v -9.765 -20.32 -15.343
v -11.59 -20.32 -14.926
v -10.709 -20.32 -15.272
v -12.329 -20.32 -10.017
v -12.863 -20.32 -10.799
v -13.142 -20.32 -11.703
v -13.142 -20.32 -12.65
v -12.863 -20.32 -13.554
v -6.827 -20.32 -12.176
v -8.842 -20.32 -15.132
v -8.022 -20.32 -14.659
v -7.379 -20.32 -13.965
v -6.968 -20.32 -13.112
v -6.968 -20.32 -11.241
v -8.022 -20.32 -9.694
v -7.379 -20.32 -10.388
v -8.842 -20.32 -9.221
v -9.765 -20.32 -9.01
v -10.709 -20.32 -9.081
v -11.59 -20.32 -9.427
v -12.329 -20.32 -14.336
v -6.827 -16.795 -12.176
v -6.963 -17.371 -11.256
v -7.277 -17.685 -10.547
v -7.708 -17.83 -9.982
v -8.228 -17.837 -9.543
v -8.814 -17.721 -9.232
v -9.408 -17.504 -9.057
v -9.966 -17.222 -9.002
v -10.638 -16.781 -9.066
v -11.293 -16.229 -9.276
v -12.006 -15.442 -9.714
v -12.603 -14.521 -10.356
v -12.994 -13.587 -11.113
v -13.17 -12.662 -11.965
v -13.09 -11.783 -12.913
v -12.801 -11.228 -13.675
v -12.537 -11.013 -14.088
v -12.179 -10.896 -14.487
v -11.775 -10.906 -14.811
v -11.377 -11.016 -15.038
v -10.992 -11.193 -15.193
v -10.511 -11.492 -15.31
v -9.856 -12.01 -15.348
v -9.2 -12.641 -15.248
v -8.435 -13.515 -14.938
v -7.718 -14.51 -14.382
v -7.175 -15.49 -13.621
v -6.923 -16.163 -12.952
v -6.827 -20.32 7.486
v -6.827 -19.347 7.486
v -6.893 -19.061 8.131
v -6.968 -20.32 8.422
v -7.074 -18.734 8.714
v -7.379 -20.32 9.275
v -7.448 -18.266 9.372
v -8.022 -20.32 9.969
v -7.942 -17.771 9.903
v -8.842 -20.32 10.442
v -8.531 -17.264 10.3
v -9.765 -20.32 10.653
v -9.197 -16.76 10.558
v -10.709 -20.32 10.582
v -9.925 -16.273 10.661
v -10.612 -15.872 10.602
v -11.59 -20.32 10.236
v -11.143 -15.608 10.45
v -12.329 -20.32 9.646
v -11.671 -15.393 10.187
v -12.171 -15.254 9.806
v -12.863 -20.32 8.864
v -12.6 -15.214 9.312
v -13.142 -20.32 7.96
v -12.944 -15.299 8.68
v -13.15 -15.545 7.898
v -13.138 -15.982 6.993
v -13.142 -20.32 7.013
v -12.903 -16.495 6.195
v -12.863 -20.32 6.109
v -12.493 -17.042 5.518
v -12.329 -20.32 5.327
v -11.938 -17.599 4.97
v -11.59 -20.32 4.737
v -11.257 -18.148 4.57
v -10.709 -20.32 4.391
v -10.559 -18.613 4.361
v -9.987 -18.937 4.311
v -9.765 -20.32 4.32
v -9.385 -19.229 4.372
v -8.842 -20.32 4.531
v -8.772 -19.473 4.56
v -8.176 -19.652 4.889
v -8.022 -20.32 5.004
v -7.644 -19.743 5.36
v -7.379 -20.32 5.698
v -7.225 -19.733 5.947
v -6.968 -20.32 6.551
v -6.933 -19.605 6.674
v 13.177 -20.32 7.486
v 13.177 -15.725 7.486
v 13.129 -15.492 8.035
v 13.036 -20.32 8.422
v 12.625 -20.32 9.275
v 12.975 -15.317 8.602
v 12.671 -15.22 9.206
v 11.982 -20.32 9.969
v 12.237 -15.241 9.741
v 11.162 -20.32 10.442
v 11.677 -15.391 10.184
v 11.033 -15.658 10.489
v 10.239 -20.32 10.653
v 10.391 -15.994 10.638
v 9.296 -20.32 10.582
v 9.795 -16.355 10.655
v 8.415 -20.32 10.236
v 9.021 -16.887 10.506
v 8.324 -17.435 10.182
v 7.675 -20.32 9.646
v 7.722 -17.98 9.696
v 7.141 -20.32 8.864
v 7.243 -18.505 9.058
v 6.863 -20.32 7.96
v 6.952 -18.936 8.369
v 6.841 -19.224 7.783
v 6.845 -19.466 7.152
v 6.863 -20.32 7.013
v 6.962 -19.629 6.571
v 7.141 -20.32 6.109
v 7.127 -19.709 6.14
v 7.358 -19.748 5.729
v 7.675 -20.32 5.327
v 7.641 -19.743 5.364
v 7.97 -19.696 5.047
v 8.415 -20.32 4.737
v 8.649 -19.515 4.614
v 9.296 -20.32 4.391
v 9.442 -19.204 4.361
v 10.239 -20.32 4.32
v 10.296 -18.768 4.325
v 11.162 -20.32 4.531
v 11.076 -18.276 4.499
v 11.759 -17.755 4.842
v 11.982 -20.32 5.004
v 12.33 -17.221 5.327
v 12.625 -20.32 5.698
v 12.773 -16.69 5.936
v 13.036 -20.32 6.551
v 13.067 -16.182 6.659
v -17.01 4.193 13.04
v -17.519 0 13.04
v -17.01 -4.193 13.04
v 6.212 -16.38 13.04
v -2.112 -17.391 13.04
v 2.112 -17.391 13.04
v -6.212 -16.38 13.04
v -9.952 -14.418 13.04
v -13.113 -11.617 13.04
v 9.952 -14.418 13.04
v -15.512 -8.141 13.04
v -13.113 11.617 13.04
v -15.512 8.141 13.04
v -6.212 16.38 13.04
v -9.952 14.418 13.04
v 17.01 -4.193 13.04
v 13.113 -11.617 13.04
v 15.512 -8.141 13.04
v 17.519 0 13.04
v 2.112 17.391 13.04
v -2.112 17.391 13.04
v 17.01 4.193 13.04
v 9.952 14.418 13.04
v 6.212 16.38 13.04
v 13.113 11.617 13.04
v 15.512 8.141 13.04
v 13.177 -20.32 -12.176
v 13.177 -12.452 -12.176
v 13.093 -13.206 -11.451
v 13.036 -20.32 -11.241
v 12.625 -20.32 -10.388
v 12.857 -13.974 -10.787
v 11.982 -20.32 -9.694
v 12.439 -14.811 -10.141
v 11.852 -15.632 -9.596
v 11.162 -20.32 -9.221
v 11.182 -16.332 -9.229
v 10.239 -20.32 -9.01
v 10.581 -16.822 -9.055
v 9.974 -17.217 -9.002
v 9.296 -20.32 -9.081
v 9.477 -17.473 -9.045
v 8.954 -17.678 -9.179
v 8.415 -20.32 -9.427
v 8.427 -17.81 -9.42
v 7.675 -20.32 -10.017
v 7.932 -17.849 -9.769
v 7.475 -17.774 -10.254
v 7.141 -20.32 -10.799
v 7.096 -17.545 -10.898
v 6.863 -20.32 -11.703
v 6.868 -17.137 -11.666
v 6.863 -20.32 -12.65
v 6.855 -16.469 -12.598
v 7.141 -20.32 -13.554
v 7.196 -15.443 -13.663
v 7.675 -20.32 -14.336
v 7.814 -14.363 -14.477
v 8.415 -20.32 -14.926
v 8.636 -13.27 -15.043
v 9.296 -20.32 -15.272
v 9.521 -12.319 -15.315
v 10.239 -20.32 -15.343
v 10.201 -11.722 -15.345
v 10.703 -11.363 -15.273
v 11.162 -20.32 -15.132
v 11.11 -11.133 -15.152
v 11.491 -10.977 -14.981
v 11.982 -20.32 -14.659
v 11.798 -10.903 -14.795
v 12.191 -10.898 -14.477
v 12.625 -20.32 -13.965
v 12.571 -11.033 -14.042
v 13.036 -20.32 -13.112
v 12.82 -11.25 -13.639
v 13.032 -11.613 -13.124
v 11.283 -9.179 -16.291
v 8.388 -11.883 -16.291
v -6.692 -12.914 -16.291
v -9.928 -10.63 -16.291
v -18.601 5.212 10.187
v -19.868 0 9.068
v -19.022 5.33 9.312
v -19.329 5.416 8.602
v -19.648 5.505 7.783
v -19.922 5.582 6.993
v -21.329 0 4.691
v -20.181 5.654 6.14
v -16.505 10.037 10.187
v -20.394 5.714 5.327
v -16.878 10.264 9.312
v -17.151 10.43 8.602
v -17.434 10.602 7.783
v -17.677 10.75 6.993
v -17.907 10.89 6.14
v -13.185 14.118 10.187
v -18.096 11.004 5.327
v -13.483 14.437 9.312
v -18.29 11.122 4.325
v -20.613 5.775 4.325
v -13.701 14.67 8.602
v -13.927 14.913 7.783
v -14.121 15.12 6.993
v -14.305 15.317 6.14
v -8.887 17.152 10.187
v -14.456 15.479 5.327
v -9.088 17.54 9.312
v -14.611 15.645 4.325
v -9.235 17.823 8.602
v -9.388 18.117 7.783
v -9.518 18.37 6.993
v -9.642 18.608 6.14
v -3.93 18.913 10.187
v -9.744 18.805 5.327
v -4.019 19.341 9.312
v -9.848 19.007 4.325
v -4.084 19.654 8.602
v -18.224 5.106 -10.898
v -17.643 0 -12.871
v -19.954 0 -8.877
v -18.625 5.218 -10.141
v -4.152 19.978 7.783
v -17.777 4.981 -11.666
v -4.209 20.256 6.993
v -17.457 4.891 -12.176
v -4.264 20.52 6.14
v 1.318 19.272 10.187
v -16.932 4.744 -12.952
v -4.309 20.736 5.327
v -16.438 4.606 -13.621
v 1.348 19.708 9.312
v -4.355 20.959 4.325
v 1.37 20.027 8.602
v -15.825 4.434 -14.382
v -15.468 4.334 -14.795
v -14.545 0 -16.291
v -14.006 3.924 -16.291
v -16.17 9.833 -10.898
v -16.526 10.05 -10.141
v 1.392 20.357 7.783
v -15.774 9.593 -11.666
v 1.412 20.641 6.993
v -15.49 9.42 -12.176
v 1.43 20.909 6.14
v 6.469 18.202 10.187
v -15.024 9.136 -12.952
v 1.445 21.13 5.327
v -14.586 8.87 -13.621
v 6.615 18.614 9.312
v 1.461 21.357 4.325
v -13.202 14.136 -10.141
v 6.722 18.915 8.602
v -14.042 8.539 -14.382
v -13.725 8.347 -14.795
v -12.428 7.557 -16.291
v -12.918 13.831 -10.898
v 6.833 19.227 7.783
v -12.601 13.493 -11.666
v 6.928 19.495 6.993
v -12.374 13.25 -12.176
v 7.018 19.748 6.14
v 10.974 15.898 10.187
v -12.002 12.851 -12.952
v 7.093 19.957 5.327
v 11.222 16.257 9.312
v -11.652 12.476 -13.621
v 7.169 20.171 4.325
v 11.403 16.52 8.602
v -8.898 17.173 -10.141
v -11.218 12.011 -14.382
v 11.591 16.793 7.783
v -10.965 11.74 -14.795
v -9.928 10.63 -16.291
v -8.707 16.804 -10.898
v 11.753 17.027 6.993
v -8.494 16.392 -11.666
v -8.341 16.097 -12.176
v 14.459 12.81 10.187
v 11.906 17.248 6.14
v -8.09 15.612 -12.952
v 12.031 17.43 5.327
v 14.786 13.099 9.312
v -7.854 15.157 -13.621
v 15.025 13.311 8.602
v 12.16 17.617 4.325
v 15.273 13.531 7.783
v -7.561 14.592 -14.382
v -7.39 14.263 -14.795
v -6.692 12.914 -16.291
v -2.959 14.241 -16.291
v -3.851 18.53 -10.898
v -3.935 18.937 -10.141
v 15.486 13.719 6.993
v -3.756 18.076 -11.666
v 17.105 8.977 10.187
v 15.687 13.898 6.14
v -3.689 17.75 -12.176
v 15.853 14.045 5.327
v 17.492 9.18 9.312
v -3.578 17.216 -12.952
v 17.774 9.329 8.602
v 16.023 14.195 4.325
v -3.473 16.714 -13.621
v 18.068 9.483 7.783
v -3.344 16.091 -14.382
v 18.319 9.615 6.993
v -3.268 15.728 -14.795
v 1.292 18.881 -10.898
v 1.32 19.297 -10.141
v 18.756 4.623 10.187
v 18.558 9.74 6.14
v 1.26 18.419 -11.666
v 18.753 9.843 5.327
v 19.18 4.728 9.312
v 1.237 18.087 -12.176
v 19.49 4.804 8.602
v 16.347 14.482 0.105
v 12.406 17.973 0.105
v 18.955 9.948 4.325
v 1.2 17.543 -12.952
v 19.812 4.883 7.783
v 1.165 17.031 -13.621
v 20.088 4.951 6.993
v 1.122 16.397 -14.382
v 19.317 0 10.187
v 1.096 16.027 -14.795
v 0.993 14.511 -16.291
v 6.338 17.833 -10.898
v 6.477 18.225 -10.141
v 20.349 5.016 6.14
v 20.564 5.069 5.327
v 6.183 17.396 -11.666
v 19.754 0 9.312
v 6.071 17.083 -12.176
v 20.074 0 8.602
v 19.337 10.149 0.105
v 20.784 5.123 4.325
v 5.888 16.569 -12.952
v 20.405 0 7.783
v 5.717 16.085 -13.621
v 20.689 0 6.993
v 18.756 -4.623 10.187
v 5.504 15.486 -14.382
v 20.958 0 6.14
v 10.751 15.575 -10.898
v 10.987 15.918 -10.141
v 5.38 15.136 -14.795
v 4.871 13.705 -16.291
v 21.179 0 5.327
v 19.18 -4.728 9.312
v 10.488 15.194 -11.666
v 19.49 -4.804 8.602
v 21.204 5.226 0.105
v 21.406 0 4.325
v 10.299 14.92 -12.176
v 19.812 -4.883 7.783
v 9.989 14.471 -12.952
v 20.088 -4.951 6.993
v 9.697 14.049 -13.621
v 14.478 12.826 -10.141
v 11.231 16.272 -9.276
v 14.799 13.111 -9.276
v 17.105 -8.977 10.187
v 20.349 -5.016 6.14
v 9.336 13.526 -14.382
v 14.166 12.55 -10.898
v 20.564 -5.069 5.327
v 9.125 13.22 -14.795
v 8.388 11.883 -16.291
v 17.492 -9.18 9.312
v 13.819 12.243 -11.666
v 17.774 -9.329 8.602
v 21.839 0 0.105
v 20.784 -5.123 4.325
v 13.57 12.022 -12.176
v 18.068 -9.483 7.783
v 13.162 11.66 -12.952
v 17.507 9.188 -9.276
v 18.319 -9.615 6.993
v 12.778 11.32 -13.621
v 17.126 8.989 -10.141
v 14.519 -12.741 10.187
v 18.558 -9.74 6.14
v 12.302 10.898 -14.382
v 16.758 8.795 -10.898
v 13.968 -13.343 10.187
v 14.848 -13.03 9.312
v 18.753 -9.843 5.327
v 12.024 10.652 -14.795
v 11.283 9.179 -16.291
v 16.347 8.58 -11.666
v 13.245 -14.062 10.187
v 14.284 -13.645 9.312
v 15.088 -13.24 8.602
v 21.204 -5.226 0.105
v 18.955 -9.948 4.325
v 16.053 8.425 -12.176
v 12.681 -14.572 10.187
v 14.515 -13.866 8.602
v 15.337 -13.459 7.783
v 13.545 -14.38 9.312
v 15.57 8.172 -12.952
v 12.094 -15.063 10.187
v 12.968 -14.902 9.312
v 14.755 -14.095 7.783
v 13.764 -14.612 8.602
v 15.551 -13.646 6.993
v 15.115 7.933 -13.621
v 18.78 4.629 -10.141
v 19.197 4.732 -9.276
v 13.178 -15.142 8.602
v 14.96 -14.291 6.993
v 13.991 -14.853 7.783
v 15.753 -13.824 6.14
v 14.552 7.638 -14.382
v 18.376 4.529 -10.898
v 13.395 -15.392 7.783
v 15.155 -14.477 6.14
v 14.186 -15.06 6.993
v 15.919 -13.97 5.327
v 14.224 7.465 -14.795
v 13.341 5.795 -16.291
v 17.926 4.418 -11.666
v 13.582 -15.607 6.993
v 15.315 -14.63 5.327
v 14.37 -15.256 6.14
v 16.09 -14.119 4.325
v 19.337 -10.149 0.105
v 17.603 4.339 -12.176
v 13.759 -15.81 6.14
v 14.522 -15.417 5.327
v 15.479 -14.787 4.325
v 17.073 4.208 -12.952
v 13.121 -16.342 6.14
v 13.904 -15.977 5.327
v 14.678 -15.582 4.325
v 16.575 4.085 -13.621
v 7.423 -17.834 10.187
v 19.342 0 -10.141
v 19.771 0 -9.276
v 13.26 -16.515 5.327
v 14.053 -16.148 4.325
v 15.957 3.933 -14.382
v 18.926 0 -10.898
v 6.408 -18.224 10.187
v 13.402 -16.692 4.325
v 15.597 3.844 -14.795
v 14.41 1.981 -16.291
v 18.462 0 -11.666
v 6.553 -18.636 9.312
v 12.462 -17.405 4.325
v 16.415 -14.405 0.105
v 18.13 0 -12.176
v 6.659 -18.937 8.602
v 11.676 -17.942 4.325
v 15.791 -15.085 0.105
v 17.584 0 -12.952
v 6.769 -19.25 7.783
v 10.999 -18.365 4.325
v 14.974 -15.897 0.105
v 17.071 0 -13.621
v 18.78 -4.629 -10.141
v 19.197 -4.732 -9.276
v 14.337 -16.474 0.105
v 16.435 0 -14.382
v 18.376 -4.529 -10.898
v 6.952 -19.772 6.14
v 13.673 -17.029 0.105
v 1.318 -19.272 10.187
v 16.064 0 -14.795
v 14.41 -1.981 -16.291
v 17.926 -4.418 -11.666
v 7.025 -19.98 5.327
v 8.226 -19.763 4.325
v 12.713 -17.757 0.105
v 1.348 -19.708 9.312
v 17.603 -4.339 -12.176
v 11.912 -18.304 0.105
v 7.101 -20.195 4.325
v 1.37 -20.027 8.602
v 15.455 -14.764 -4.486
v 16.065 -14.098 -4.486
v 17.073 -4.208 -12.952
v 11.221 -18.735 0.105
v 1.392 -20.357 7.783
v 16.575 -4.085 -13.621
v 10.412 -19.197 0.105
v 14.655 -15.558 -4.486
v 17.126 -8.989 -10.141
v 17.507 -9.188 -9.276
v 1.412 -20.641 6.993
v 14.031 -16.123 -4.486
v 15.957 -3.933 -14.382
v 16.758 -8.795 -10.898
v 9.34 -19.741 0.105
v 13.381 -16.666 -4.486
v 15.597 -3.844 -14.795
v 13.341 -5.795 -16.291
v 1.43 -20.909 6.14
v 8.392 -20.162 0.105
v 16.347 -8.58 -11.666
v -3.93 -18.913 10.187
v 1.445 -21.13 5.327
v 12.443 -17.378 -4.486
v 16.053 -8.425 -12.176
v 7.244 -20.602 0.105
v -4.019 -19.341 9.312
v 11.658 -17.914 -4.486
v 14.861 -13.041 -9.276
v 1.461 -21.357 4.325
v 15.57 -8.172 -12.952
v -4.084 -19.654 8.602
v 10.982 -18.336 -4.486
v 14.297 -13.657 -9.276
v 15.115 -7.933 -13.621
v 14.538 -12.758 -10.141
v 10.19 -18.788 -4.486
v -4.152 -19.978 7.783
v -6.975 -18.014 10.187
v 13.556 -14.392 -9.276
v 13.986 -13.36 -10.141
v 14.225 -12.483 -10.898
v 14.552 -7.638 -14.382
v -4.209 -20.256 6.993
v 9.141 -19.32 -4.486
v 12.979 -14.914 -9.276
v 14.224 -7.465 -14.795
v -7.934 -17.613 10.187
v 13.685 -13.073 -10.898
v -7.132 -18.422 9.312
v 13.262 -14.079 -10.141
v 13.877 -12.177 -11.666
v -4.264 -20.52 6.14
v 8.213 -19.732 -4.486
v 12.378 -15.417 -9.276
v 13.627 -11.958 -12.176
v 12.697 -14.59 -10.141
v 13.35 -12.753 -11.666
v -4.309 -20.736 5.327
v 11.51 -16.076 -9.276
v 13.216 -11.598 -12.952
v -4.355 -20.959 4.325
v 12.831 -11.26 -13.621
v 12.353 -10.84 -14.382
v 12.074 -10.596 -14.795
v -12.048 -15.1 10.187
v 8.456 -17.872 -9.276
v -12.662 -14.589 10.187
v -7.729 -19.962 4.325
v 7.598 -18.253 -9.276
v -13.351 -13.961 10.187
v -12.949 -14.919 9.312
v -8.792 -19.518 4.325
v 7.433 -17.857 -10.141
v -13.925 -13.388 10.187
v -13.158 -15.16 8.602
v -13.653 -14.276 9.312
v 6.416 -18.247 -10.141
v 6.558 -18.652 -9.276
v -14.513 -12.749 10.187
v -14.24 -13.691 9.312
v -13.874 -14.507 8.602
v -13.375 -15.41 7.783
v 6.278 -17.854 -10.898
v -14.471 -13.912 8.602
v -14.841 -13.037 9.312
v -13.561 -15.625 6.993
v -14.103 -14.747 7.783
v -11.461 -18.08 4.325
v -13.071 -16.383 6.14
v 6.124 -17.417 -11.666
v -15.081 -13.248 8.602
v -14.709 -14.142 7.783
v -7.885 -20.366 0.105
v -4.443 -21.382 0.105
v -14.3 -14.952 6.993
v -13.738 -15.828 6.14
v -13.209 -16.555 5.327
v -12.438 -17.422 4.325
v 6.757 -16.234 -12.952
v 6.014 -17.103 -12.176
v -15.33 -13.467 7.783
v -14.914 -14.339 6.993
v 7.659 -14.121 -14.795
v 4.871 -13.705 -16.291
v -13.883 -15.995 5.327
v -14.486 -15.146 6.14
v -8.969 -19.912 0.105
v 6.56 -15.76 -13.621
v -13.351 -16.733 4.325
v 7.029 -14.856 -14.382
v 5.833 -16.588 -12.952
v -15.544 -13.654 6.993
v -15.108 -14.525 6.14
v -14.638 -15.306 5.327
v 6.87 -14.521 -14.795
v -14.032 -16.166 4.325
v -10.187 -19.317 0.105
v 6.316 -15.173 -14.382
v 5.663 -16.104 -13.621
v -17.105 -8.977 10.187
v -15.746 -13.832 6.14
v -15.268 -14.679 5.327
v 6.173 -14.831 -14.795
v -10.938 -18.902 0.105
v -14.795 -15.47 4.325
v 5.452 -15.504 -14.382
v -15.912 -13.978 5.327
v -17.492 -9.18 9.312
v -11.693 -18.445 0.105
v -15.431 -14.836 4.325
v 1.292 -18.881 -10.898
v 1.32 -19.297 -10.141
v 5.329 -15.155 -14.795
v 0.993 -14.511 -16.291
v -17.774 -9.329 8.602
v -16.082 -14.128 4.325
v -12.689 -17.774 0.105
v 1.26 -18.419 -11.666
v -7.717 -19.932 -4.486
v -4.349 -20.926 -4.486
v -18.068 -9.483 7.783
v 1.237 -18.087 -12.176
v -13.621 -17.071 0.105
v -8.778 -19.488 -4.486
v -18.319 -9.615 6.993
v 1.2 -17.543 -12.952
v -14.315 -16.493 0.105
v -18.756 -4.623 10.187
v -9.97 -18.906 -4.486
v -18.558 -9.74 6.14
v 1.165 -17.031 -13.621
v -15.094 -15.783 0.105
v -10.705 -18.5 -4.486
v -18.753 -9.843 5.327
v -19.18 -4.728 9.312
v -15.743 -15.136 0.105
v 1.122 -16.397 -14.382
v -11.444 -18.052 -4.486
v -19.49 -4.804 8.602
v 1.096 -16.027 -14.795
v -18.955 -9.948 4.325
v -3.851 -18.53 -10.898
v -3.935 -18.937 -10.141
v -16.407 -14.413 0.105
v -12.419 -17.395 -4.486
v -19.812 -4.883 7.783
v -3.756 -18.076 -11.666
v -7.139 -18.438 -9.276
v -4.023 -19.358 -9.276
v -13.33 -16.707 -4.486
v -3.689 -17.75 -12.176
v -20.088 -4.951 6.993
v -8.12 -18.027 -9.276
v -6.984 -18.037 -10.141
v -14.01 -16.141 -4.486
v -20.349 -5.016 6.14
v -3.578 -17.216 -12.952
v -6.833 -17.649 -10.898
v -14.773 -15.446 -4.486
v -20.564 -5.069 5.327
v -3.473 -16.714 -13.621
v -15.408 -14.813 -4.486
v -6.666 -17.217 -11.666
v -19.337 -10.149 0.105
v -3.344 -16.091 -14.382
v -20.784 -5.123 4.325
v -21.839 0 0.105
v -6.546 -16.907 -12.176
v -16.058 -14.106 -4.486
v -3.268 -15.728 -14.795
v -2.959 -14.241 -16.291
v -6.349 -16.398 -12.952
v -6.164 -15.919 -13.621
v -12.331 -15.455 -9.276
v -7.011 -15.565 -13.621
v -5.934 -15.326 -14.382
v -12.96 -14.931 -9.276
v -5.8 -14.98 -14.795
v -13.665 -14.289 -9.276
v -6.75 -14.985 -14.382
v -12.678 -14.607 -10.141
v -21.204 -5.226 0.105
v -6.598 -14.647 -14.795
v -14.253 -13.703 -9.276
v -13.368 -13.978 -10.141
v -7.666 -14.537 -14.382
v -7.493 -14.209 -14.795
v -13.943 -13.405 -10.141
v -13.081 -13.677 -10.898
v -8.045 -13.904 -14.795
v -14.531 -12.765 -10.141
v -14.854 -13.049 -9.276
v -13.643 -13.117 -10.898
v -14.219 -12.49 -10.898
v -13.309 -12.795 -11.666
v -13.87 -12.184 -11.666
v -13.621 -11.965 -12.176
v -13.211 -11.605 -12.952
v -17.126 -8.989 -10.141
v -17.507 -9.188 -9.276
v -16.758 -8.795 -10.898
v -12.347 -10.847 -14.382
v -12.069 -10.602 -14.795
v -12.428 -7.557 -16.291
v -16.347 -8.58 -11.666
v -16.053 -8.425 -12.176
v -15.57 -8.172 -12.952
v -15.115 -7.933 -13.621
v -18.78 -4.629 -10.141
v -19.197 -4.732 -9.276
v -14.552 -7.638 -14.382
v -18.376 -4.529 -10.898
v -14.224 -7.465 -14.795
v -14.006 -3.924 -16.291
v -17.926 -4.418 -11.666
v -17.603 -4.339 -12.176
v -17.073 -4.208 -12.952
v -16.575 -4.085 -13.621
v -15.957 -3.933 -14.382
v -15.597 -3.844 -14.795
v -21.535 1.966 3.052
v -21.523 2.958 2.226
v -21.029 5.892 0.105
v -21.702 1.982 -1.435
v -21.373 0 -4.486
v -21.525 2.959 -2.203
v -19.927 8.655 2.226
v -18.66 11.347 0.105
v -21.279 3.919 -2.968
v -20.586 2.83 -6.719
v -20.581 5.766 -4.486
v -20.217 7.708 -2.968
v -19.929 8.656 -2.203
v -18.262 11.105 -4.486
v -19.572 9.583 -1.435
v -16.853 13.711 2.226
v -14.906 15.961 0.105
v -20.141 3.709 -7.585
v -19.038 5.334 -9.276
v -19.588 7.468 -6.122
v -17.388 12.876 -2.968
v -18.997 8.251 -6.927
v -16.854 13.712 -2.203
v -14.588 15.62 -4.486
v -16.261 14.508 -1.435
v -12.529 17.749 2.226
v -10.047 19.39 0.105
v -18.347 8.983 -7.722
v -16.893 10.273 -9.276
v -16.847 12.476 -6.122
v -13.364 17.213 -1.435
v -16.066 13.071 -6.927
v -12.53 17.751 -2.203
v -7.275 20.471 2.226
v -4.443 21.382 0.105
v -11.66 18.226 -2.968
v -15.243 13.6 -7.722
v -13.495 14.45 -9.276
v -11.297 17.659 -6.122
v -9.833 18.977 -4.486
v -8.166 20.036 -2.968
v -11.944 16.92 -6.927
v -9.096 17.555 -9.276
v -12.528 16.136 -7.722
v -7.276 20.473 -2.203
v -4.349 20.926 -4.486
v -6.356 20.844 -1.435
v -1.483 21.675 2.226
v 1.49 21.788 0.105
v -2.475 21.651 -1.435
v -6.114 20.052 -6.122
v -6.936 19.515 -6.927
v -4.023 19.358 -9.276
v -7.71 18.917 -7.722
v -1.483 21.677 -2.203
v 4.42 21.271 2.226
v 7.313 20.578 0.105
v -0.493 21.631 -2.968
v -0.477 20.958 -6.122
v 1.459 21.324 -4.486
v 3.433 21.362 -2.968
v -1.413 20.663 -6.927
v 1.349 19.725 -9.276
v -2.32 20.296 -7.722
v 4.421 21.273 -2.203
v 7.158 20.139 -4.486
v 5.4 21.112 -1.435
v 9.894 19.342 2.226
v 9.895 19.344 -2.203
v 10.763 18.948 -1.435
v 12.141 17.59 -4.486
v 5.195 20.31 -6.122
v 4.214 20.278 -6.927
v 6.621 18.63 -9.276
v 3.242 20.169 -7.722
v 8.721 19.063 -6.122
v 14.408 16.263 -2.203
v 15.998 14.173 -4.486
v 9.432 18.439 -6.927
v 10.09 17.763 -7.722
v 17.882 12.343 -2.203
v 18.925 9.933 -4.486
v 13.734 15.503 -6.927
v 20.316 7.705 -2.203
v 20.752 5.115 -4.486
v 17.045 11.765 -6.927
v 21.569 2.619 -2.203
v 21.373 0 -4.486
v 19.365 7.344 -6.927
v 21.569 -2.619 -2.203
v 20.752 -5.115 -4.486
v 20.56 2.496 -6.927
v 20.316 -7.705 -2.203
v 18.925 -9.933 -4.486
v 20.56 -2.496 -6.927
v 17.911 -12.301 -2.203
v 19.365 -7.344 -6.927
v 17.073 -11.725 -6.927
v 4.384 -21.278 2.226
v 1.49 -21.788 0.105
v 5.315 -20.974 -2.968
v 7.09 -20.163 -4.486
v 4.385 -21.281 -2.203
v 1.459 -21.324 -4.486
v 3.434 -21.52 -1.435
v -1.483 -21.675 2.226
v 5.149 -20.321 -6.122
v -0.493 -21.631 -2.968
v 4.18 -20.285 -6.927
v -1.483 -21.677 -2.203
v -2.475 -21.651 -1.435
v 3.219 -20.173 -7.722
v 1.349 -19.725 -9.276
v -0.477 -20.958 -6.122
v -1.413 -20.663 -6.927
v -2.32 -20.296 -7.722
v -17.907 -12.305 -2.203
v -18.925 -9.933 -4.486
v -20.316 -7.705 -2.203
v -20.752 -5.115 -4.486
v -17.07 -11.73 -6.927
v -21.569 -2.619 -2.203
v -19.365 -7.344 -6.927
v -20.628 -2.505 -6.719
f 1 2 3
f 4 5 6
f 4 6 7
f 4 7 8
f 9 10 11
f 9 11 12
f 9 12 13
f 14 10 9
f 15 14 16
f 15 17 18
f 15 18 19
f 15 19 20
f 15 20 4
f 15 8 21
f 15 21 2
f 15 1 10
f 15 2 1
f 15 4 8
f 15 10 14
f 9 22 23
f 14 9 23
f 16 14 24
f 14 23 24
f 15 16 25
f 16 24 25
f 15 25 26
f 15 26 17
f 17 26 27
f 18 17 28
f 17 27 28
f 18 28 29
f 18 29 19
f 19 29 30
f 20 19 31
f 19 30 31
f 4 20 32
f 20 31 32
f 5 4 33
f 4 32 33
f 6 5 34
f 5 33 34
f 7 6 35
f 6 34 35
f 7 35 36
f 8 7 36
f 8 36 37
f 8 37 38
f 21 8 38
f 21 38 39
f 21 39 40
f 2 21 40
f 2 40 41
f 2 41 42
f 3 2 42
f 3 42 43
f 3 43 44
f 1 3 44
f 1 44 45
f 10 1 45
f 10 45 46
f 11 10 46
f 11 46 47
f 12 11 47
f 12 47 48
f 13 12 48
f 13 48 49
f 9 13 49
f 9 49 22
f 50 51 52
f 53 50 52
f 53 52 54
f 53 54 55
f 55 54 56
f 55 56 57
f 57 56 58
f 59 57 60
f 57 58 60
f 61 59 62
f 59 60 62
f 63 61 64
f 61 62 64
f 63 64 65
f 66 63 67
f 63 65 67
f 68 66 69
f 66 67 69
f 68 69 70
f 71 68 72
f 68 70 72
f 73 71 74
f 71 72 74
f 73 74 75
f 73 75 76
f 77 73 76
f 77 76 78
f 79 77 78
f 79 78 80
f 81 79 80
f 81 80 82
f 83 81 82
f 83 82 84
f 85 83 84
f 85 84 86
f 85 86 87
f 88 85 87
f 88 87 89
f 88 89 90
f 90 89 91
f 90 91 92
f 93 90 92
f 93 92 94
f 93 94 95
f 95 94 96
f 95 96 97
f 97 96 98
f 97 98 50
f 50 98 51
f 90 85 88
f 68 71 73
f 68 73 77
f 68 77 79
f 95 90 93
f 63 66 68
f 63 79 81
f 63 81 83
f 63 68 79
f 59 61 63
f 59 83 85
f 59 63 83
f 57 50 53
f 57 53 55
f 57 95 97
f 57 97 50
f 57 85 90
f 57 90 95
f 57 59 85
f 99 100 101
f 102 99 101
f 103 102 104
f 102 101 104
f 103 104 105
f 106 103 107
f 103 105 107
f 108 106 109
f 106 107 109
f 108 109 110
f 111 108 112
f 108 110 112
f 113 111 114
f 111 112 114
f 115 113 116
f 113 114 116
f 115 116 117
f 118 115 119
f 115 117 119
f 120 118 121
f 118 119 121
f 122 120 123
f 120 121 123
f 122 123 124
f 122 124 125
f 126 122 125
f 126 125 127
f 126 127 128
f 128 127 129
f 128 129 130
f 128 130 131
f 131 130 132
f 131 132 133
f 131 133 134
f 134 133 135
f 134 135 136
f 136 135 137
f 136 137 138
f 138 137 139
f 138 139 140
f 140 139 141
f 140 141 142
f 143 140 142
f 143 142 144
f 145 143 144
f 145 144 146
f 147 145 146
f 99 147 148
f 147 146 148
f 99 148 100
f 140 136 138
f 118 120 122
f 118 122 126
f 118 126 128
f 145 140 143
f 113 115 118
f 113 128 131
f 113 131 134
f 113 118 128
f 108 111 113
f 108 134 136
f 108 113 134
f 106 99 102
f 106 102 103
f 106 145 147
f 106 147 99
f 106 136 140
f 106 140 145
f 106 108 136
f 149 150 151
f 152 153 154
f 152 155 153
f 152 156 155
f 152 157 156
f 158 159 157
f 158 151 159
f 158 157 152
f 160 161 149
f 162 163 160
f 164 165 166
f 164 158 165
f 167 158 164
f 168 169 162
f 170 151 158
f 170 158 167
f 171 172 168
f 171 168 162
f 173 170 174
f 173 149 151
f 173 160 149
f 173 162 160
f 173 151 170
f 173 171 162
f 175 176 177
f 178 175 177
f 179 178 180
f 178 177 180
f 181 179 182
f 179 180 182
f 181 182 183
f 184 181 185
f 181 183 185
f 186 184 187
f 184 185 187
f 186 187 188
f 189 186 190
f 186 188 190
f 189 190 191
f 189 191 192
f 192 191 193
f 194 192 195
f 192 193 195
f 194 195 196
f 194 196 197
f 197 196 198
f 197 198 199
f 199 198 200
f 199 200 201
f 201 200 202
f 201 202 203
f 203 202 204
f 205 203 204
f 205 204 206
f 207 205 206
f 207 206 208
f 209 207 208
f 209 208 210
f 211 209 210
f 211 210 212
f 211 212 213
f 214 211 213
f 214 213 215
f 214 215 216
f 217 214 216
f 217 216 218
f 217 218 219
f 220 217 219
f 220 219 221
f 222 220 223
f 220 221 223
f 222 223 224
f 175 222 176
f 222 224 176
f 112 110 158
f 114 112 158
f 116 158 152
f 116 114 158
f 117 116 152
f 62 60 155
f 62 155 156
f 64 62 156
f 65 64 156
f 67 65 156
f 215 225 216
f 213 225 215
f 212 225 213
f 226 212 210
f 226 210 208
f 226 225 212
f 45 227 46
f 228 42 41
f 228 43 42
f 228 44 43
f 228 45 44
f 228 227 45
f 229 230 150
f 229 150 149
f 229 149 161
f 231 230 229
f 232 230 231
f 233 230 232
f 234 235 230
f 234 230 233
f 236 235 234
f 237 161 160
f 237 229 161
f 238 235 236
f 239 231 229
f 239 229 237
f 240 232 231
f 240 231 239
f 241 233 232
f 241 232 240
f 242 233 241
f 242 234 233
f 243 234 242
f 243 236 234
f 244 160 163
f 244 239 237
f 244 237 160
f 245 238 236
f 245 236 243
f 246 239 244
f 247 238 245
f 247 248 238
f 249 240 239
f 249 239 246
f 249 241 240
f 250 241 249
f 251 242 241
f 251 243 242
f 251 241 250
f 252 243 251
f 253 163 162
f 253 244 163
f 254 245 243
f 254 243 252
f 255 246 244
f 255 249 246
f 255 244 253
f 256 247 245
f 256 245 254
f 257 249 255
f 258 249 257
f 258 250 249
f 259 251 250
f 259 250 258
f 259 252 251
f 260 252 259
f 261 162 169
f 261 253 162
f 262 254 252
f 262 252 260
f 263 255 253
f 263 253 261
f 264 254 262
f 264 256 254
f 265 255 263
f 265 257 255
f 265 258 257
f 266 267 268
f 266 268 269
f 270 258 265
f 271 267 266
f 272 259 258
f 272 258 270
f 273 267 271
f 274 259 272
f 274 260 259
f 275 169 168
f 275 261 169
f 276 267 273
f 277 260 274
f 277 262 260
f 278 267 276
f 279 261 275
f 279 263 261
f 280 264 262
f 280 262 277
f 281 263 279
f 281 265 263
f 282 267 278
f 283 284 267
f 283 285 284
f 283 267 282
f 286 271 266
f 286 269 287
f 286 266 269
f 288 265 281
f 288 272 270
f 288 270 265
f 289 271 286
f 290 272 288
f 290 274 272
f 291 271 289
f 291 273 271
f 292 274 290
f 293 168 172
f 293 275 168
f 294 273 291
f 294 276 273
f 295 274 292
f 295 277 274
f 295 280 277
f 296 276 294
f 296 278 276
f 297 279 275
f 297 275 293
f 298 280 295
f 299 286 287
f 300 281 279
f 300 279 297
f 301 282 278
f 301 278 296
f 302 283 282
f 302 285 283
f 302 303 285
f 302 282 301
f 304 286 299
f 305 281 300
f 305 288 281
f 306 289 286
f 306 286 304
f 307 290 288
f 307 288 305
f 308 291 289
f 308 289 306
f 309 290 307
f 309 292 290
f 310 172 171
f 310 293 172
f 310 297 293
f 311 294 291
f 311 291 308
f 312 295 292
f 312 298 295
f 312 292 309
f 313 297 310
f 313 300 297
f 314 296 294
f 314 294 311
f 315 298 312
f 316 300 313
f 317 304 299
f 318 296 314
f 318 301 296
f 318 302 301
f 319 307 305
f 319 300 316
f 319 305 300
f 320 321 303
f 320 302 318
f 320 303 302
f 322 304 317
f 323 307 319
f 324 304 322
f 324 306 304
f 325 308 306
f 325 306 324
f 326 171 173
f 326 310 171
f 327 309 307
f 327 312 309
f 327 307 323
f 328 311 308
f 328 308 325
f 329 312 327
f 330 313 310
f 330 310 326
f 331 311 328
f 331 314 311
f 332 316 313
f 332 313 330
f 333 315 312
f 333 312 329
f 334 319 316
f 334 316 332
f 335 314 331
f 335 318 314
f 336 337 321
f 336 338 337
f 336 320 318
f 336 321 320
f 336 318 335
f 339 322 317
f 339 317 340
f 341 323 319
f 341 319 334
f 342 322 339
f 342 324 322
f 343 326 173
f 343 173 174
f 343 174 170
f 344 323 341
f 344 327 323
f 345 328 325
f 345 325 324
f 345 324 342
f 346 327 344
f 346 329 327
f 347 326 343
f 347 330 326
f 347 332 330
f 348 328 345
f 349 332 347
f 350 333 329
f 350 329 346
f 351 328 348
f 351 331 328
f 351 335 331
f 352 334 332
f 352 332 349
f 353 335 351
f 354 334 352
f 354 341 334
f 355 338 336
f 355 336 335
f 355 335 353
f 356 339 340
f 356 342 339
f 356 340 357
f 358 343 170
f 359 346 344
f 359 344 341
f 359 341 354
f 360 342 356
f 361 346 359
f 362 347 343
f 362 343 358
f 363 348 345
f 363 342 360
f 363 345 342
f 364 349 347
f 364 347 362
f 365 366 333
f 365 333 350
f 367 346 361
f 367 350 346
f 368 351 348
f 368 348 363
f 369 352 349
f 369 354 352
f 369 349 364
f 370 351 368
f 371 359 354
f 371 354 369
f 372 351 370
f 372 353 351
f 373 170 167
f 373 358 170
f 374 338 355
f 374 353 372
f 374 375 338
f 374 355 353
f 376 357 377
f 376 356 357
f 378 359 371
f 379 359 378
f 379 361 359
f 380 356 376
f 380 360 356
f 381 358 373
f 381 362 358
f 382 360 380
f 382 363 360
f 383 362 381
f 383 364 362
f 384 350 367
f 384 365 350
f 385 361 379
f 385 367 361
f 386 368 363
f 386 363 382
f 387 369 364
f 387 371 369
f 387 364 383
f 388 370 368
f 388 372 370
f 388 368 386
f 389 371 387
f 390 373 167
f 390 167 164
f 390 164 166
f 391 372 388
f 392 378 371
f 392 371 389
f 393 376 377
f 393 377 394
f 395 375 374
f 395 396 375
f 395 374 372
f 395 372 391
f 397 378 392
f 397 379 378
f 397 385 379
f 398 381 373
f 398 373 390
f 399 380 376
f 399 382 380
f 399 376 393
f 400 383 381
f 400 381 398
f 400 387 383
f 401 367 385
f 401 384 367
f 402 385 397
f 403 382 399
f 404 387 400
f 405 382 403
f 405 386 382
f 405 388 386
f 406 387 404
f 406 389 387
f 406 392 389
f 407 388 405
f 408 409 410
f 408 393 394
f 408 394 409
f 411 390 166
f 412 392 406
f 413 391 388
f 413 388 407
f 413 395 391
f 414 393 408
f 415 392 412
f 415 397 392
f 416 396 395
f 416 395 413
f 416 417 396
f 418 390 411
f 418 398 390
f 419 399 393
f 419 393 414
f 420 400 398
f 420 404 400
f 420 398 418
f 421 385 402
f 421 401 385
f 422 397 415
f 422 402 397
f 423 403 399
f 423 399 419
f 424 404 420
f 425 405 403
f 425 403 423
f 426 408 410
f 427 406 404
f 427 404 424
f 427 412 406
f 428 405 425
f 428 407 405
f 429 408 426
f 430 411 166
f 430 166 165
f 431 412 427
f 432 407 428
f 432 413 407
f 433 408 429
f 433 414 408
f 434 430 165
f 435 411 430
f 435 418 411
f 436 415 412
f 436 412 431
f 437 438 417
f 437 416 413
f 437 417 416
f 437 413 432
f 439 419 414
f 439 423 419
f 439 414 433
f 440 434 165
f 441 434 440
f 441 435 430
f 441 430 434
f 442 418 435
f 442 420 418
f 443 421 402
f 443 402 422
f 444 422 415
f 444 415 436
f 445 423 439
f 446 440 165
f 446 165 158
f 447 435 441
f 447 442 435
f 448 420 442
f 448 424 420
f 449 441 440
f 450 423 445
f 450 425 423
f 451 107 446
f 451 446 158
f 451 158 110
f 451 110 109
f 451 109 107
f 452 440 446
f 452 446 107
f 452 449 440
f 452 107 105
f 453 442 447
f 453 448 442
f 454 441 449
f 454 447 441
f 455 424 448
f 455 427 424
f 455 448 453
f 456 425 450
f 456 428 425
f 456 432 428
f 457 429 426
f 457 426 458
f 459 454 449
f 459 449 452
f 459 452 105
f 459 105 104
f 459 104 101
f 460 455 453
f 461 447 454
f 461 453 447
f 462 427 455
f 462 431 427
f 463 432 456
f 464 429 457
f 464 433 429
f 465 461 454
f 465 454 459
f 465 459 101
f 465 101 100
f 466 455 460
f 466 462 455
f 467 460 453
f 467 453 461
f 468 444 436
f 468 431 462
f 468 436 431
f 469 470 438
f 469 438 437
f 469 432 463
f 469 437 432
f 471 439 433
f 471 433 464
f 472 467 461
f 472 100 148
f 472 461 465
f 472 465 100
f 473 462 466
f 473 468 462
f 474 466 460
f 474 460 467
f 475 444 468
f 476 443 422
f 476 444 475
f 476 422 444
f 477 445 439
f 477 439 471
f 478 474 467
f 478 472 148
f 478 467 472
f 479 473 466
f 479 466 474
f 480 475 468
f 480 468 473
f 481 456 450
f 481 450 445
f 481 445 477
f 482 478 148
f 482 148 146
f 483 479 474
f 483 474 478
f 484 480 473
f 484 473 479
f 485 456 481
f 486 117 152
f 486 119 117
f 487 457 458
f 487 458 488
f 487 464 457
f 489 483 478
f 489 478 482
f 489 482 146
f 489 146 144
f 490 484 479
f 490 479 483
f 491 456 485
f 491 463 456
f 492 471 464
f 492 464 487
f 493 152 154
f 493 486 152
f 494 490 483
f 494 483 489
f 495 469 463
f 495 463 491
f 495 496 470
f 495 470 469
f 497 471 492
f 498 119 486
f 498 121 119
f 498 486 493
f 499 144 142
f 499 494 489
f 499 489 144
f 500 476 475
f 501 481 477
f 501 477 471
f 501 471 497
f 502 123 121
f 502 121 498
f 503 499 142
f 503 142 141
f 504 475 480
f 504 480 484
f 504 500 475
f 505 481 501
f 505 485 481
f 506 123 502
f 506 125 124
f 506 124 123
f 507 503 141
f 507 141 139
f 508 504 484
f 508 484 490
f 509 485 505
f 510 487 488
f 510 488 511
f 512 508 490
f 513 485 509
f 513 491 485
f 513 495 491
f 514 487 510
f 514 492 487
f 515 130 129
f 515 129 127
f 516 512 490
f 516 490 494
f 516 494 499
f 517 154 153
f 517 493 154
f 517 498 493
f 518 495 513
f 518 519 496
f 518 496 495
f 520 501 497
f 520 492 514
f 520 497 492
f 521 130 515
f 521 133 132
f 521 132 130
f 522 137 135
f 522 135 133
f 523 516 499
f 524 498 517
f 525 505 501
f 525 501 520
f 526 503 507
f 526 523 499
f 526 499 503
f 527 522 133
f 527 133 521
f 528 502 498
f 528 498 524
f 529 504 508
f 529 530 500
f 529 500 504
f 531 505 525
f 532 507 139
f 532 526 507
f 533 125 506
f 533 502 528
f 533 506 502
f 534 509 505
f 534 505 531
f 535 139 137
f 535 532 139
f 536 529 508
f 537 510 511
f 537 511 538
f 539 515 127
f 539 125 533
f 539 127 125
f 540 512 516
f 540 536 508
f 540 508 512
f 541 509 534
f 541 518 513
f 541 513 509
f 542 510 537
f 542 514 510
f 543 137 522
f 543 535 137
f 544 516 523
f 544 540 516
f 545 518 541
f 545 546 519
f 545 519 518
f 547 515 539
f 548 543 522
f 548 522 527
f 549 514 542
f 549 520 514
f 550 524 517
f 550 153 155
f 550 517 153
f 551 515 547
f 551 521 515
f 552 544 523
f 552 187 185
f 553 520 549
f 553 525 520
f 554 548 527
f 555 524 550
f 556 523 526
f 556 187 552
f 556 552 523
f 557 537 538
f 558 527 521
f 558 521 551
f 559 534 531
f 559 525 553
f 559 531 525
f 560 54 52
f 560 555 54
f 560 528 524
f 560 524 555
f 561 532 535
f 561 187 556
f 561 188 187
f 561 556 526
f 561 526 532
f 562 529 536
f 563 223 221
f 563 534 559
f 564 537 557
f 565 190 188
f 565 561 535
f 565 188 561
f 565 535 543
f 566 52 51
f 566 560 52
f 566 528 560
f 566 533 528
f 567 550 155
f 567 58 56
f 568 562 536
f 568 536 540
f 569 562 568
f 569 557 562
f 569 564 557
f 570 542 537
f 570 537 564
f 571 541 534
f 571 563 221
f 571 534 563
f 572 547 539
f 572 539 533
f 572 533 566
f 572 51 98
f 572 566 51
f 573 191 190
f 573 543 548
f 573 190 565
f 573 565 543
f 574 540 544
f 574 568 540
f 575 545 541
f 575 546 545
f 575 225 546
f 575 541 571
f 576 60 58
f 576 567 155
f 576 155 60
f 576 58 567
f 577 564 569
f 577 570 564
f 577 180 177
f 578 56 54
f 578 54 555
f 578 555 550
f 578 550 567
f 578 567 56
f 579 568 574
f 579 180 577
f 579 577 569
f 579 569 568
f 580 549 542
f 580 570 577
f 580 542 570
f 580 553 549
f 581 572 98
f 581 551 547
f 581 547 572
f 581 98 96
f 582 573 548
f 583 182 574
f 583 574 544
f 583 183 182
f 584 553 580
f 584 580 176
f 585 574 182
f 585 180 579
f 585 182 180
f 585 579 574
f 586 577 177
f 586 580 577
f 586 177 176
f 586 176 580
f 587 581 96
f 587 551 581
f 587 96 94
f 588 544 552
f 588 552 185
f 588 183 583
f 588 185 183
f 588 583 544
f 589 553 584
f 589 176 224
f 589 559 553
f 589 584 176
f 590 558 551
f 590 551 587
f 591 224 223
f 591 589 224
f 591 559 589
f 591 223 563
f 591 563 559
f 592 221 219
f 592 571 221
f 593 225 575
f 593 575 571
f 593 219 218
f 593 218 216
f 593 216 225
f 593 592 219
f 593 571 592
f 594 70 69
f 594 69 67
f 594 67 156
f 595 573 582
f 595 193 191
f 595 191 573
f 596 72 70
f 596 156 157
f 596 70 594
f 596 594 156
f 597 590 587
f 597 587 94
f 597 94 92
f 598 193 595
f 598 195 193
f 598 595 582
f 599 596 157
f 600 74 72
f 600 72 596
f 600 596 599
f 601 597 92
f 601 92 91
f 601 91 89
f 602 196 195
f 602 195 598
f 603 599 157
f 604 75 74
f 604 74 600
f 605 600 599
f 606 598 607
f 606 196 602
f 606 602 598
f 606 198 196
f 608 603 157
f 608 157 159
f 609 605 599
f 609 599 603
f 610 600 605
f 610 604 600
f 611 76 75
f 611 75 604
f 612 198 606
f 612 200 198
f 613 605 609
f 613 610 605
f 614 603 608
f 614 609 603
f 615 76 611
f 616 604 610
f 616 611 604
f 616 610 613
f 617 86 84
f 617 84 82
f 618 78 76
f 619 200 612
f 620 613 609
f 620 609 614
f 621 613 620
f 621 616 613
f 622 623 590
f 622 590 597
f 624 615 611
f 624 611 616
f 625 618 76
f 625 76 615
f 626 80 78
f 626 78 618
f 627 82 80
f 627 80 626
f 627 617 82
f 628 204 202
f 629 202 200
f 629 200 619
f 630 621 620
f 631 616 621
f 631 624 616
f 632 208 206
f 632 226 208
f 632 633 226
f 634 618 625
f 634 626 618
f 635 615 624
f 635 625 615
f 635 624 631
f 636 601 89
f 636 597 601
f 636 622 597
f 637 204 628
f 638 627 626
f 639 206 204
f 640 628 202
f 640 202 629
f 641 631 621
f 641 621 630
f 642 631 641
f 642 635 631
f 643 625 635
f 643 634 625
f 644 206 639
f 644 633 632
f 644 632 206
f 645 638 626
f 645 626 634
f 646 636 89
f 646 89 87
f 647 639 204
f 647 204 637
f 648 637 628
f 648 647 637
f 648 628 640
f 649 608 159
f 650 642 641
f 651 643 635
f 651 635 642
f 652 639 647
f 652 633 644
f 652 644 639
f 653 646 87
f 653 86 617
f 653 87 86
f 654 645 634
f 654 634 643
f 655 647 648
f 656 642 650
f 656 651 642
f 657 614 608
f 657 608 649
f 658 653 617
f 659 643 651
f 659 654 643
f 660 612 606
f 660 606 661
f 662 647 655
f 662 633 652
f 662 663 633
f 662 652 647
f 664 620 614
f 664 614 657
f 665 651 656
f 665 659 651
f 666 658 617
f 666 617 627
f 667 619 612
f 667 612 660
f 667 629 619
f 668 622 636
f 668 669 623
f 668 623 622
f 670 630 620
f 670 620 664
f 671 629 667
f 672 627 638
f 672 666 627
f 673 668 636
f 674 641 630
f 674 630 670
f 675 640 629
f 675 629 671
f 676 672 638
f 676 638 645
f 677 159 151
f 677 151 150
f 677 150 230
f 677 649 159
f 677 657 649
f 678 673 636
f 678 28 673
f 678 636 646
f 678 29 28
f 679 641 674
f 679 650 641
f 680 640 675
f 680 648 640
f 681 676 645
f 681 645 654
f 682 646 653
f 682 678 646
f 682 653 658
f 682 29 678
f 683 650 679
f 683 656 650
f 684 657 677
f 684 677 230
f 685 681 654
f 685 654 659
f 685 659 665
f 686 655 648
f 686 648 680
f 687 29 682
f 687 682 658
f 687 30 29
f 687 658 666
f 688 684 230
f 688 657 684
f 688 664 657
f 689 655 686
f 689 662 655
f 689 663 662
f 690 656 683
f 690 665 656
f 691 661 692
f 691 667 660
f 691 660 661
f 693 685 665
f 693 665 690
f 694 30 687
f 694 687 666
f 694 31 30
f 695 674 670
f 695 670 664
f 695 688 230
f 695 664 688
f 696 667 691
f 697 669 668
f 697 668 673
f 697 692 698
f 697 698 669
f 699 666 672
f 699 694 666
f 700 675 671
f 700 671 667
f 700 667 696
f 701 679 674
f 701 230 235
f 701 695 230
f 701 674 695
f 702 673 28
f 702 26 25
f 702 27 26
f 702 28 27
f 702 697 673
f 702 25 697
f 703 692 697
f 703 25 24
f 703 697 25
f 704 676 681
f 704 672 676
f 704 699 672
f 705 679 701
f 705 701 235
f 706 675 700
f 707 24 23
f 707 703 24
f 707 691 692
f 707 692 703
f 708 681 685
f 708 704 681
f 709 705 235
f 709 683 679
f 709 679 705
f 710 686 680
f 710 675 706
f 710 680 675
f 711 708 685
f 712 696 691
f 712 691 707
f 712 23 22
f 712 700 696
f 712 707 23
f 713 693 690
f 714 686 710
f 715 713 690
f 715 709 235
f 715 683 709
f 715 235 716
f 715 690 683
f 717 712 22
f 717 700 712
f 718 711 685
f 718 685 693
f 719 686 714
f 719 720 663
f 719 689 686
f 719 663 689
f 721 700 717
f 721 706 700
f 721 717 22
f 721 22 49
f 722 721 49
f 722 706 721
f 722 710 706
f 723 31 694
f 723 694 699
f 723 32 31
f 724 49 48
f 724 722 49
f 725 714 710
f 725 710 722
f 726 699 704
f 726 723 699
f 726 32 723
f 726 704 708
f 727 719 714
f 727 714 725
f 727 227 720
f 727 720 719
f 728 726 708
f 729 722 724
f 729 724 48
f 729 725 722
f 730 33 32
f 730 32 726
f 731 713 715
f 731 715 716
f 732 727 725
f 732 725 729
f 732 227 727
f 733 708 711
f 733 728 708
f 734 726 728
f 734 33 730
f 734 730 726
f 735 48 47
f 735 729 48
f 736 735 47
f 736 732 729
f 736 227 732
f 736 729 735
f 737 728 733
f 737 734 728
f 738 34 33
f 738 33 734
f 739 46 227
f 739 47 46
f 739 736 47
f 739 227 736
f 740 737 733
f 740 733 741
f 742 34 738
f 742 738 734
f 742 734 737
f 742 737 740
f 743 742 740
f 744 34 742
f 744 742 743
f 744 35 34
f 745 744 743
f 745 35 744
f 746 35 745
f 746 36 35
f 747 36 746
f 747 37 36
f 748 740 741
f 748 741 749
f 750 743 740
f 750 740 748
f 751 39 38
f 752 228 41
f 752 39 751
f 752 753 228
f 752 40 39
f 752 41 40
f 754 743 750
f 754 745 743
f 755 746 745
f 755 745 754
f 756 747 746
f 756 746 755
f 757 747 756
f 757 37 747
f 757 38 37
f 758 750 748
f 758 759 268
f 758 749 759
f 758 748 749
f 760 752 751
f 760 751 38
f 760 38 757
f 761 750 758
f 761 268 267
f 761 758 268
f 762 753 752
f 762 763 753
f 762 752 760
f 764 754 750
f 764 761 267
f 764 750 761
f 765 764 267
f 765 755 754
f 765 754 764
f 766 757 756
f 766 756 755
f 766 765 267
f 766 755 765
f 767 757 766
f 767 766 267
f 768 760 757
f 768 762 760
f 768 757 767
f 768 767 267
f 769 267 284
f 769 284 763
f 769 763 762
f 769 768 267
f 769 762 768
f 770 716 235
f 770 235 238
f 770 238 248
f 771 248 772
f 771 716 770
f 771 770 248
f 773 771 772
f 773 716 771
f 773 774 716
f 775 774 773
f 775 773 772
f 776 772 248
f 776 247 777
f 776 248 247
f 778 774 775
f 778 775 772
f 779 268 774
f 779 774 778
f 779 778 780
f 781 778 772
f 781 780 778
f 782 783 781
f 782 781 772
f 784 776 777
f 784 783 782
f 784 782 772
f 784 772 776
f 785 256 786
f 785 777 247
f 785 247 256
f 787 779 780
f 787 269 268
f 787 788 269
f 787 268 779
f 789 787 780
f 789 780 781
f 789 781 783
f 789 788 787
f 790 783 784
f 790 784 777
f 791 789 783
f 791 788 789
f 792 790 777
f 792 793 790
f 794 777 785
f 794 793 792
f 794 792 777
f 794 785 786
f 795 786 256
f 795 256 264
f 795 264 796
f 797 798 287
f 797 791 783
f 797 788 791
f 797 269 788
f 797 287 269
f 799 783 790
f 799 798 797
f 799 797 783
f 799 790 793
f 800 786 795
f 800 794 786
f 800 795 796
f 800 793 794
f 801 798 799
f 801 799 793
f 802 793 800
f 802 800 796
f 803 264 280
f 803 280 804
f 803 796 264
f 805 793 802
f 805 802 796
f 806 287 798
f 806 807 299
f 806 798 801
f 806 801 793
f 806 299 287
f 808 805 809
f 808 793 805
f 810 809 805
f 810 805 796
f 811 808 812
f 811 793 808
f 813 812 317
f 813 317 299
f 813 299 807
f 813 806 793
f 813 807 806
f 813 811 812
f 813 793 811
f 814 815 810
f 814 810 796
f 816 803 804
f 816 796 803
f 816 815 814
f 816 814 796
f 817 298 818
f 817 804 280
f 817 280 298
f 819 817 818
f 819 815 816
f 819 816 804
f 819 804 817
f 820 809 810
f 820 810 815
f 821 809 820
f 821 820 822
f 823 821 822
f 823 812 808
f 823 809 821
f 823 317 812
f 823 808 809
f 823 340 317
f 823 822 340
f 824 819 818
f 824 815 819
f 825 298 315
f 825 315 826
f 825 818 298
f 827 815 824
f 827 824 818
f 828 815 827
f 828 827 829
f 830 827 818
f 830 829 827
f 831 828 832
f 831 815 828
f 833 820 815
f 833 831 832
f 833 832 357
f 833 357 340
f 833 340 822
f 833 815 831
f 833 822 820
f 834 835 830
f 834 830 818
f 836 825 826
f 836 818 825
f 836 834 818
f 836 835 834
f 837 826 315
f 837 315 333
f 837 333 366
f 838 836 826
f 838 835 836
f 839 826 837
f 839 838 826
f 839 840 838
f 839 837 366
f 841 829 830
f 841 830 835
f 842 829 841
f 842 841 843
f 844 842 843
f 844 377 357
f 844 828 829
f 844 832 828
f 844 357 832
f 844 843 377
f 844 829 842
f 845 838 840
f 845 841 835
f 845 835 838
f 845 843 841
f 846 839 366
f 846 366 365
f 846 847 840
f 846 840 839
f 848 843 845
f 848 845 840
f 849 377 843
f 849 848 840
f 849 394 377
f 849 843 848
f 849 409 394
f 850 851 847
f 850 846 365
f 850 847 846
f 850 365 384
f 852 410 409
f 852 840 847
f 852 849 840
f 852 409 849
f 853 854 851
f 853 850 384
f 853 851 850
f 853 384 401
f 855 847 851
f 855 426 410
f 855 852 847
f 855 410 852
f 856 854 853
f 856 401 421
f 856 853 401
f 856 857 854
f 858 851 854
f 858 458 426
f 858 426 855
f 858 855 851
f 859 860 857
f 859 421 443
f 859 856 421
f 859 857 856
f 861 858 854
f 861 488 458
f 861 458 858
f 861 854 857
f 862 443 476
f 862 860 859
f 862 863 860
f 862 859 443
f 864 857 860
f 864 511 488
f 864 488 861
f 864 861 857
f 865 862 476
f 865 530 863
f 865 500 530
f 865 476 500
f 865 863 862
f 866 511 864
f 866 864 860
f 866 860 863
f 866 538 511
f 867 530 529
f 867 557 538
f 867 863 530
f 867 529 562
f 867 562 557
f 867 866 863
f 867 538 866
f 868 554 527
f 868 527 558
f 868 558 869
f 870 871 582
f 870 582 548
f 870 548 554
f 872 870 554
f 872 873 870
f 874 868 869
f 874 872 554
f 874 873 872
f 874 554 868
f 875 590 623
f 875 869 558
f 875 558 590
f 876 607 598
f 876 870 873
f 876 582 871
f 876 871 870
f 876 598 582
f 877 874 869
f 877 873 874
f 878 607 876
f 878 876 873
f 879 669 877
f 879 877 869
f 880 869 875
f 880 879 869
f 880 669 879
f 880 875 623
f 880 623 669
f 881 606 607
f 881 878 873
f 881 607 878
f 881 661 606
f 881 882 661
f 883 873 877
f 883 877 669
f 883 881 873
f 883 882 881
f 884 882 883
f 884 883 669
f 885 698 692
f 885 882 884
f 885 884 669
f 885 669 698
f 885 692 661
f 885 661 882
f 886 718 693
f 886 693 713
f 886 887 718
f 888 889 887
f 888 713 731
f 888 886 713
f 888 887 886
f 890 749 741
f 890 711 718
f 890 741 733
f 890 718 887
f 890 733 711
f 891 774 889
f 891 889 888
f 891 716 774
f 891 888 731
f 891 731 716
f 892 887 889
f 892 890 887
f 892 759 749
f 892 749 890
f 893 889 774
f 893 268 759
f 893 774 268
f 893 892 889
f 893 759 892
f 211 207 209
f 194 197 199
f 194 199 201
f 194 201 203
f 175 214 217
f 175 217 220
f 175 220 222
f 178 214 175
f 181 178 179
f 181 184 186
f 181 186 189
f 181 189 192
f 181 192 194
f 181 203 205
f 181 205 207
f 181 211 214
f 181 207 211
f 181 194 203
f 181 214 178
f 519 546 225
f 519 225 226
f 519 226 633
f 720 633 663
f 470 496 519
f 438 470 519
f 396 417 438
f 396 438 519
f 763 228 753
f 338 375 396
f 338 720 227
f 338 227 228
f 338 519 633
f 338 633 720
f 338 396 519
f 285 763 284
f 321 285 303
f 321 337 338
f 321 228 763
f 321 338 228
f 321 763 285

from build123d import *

# Parameters (mm, degrees)
F2_R     = 3.175
F3_DEPTH = 20.32


with BuildPart() as f1:
    # F0 (on Front) → F1 (revolve)
    with BuildSketch(Plane.XZ):
        with BuildLine():
            Line((0, 13.039744), (-17.51884, 13.039744))
            ThreePointArc((-17.51884, 13.039744), (-21.72768, -2.20286), (-14.545188, -16.290555))
            Line((-14.545188, -16.290555), (0, -16.290555))
            Line((0, -16.290555), (0, 13.039744))
        make_face()
    revolve(axis=Axis((0, 0, -1.739485), (0, 0, -1)))

    # F2 (on Front) → F3 (join)
    with BuildSketch(Plane.XZ):
        with Locations((-10.002056, -12.176418)):
            Circle(F2_R)
        with Locations((10.002056, -12.176418)):
            Circle(F2_R)
        with Locations((-10.002056, 7.48646)):
            Circle(F2_R)
        with Locations((10.002056, 7.48646)):
            Circle(F2_R)
    extrude(amount=F3_DEPTH)


solid = f1.part
